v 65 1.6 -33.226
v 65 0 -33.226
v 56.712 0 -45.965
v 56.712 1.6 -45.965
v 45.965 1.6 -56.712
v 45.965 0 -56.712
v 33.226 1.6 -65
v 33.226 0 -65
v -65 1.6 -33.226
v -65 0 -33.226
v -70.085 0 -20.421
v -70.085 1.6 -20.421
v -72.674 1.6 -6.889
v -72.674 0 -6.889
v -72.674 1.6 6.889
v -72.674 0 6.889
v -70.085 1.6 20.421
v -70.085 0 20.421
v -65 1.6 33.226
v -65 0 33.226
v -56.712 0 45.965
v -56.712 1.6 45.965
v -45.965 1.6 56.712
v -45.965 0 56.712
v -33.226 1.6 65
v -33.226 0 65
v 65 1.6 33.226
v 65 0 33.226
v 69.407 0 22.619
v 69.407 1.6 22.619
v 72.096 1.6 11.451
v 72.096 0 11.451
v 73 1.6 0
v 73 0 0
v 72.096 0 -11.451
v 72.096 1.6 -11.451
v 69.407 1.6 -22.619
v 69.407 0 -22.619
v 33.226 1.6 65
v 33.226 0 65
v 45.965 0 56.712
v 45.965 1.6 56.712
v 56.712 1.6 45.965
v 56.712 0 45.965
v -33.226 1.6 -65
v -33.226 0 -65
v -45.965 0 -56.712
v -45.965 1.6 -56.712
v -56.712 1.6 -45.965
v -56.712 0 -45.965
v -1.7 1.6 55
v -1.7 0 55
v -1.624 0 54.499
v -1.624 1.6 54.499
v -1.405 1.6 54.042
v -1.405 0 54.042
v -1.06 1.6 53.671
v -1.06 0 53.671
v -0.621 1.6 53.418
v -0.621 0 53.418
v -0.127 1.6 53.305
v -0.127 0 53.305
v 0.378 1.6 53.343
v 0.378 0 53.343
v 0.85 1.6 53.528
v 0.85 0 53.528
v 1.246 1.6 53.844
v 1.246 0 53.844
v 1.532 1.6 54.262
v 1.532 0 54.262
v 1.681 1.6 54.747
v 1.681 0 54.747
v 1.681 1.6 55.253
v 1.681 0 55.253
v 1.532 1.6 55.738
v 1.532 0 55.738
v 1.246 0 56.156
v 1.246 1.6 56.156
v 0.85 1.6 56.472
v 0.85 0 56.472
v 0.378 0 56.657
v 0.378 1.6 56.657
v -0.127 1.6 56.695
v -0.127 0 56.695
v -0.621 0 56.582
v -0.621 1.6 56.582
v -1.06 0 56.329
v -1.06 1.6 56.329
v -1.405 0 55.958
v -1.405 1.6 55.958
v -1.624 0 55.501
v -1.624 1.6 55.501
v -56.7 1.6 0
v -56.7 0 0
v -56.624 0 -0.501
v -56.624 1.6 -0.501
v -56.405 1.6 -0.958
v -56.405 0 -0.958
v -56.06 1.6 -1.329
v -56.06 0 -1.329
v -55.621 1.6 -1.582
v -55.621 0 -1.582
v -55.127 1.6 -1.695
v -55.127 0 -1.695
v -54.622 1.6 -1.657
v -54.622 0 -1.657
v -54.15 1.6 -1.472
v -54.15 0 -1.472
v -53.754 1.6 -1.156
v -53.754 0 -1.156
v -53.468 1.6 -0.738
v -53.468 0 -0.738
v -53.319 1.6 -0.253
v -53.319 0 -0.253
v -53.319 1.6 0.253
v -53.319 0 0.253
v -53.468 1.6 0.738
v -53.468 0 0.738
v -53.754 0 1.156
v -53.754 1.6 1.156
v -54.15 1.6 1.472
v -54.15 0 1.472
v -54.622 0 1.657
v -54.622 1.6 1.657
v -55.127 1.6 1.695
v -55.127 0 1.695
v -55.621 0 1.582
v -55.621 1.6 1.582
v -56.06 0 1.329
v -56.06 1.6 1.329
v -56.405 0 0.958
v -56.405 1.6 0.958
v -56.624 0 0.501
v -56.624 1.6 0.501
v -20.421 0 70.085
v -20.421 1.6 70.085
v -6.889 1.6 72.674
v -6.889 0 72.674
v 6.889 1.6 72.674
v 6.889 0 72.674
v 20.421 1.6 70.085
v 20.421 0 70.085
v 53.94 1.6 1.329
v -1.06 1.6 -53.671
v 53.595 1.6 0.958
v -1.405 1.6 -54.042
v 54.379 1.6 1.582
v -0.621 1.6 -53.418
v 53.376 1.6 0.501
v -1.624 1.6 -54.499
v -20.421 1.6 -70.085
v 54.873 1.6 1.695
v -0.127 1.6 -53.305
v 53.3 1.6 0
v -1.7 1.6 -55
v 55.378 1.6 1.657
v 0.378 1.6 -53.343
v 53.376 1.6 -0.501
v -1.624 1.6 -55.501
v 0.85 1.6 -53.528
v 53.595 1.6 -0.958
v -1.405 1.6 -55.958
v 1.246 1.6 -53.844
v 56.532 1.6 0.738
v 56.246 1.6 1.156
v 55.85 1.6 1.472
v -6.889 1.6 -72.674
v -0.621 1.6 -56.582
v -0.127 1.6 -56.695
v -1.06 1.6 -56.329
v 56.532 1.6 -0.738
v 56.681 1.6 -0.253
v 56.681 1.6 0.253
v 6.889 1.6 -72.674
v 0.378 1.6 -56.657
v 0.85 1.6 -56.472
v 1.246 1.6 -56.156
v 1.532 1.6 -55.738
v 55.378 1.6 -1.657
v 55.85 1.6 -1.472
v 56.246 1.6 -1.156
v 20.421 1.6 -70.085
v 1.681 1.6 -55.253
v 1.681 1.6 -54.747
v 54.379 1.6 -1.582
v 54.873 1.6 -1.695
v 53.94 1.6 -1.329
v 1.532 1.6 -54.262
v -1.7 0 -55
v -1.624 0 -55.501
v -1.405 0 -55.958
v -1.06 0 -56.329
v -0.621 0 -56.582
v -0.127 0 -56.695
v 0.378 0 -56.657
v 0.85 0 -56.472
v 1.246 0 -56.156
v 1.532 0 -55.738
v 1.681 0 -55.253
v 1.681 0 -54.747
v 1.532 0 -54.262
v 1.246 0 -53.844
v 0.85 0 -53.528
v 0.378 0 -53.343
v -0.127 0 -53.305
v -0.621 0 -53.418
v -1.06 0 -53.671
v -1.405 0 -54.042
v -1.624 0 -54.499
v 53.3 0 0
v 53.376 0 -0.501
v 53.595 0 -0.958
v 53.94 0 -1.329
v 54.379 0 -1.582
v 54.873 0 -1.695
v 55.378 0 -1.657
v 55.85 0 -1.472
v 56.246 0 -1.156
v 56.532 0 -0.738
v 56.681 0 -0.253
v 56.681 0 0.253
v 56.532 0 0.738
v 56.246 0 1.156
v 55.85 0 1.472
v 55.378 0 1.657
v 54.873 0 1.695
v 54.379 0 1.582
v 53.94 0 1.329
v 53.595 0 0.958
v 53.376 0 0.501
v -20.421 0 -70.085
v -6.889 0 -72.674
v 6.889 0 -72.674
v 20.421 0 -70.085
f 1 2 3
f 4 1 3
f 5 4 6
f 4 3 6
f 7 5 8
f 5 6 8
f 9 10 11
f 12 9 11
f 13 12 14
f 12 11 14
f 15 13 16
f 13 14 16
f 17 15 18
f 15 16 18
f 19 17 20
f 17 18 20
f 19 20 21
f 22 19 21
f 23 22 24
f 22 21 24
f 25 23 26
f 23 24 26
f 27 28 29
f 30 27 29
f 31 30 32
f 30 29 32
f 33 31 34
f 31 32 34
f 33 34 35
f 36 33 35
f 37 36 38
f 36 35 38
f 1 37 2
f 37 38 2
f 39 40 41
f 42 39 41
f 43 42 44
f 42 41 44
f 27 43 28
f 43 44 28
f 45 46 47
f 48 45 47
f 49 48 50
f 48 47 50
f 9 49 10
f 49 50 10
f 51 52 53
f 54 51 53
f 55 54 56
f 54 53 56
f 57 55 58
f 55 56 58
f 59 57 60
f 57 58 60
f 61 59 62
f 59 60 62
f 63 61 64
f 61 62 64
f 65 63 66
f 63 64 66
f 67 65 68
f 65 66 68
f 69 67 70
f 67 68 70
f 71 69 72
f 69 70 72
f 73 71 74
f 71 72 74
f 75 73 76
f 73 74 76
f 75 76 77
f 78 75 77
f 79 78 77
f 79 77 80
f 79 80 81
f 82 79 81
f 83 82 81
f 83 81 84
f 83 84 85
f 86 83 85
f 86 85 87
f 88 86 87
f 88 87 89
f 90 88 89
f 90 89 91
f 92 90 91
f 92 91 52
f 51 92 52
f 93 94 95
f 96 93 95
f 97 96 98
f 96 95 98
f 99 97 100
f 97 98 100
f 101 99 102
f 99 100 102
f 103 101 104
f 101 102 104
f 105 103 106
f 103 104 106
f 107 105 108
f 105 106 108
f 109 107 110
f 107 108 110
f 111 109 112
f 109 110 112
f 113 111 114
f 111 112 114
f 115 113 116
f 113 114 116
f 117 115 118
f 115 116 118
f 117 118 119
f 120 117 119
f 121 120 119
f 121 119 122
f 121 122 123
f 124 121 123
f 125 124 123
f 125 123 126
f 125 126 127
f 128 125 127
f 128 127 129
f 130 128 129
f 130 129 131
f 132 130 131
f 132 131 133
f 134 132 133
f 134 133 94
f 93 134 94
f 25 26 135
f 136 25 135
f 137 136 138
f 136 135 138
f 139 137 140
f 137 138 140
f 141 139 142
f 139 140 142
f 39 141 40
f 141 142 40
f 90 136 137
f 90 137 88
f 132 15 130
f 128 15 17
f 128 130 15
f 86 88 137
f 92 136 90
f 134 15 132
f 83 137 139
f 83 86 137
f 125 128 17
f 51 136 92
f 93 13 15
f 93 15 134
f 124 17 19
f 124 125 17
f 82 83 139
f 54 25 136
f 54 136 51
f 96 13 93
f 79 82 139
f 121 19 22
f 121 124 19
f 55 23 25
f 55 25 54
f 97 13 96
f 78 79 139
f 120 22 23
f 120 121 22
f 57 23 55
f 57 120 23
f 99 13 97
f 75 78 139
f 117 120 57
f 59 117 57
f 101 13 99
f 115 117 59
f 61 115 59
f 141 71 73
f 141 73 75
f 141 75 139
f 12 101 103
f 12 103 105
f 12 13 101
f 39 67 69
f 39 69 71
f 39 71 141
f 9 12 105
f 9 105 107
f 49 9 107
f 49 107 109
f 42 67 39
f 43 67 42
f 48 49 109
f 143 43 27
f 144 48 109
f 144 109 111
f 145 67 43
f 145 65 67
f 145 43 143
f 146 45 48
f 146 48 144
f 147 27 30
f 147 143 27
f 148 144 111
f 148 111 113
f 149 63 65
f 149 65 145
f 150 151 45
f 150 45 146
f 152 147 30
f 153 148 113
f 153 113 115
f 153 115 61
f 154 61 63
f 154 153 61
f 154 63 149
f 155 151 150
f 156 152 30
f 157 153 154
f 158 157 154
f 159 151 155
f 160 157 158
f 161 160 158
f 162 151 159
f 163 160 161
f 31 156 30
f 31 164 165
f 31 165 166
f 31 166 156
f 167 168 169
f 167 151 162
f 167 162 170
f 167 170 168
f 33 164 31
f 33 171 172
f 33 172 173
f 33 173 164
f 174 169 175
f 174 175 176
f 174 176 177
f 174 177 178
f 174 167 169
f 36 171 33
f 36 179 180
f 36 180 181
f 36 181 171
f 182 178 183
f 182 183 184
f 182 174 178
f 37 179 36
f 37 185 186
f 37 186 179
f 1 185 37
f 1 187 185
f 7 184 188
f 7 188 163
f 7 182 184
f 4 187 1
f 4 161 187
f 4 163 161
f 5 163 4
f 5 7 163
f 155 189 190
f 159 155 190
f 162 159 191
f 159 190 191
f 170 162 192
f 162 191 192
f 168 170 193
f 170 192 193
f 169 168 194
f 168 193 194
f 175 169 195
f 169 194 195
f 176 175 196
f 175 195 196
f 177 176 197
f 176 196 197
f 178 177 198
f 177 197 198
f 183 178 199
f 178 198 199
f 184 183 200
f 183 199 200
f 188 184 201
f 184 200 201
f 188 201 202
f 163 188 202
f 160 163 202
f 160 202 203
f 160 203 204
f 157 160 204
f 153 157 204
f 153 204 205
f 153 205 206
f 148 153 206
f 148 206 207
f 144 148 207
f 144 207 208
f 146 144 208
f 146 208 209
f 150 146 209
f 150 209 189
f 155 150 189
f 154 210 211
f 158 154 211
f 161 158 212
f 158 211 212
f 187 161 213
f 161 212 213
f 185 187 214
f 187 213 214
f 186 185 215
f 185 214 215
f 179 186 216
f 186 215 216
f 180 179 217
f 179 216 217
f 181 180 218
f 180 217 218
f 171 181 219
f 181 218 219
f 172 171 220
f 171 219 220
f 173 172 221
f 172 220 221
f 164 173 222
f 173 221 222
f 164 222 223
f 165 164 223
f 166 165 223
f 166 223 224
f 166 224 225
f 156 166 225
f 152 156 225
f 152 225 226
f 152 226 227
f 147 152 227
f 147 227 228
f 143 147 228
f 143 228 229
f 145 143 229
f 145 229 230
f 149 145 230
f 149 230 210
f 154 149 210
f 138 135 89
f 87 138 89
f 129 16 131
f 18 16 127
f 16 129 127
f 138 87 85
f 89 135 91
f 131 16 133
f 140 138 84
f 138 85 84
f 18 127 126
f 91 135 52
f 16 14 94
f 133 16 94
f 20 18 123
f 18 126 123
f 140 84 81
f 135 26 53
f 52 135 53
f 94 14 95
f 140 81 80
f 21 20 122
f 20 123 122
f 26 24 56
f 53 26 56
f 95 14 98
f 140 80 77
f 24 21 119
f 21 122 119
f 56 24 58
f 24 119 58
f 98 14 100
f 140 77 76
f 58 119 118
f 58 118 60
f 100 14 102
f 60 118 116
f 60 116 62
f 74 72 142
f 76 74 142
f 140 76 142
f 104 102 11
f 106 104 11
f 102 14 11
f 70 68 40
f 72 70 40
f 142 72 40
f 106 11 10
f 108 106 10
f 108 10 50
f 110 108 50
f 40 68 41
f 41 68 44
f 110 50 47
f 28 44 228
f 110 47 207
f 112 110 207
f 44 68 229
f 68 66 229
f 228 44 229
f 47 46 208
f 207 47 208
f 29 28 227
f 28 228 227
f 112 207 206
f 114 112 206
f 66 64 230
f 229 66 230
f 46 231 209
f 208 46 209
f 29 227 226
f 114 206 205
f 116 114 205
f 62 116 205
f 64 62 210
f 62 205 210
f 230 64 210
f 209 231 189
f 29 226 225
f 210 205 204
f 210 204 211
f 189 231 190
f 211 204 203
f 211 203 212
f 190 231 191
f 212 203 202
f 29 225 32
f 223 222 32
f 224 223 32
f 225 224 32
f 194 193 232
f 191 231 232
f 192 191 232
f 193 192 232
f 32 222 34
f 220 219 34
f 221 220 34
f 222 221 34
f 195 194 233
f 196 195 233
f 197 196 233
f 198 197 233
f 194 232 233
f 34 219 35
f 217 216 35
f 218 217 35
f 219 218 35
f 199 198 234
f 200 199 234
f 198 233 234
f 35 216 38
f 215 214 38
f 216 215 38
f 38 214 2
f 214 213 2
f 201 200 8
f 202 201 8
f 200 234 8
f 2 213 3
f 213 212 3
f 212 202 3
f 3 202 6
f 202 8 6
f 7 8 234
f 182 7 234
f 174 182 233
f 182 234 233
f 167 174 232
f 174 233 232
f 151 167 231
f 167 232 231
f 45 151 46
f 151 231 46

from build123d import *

# Parameters (mm, degrees)
BOSS_EXTRUDE1_DEPTH  = 1.6
M3_CLEARANCE_HOLE1_D = 3.4


with BuildPart() as part:
    # Sketch1 → Boss-Extrude1 (new body)
    with BuildSketch(Plane(origin=(0, 0, 0), x_dir=(1, 0, 0), z_dir=(0, 1, 0))):
        with BuildLine():
            ThreePointArc((-65, 33.226495452), (-73, 0), (-65, -33.226495452))
            ThreePointArc((-65, -33.226495452), (-51.618795027, -51.618795027), (-33.226495452, -65))
            ThreePointArc((-33.226495452, -65), (0, -73), (33.226495452, -65))
            ThreePointArc((33.226495452, -65), (51.618795027, -51.618795027), (65, -33.226495452))
            ThreePointArc((65, -33.226495452), (70.971825396, -17.088007491), (73, 0))
            ThreePointArc((73, 0), (70.971825396, 17.088007491), (65, 33.226495452))
            ThreePointArc((65, 33.226495452), (51.618795027, 51.618795027), (33.226495452, 65))
            ThreePointArc((33.226495452, 65), (0, 73), (-33.226495452, 65))
            ThreePointArc((-33.226495452, 65), (-51.618795027, 51.618795027), (-65, 33.226495452))
        make_face()
    extrude(amount=BOSS_EXTRUDE1_DEPTH)

    # M3 Clearance Hole1 (through all)
    with Locations(Plane(origin=(0, 1.6, 0), x_dir=(1, 0, 0), z_dir=(0, 1, 0))):
        with Locations((0, 55), (55, 0), (-55, 0), (0, -55)):
            Hole(M3_CLEARANCE_HOLE1_D / 2)


solid = part.part
